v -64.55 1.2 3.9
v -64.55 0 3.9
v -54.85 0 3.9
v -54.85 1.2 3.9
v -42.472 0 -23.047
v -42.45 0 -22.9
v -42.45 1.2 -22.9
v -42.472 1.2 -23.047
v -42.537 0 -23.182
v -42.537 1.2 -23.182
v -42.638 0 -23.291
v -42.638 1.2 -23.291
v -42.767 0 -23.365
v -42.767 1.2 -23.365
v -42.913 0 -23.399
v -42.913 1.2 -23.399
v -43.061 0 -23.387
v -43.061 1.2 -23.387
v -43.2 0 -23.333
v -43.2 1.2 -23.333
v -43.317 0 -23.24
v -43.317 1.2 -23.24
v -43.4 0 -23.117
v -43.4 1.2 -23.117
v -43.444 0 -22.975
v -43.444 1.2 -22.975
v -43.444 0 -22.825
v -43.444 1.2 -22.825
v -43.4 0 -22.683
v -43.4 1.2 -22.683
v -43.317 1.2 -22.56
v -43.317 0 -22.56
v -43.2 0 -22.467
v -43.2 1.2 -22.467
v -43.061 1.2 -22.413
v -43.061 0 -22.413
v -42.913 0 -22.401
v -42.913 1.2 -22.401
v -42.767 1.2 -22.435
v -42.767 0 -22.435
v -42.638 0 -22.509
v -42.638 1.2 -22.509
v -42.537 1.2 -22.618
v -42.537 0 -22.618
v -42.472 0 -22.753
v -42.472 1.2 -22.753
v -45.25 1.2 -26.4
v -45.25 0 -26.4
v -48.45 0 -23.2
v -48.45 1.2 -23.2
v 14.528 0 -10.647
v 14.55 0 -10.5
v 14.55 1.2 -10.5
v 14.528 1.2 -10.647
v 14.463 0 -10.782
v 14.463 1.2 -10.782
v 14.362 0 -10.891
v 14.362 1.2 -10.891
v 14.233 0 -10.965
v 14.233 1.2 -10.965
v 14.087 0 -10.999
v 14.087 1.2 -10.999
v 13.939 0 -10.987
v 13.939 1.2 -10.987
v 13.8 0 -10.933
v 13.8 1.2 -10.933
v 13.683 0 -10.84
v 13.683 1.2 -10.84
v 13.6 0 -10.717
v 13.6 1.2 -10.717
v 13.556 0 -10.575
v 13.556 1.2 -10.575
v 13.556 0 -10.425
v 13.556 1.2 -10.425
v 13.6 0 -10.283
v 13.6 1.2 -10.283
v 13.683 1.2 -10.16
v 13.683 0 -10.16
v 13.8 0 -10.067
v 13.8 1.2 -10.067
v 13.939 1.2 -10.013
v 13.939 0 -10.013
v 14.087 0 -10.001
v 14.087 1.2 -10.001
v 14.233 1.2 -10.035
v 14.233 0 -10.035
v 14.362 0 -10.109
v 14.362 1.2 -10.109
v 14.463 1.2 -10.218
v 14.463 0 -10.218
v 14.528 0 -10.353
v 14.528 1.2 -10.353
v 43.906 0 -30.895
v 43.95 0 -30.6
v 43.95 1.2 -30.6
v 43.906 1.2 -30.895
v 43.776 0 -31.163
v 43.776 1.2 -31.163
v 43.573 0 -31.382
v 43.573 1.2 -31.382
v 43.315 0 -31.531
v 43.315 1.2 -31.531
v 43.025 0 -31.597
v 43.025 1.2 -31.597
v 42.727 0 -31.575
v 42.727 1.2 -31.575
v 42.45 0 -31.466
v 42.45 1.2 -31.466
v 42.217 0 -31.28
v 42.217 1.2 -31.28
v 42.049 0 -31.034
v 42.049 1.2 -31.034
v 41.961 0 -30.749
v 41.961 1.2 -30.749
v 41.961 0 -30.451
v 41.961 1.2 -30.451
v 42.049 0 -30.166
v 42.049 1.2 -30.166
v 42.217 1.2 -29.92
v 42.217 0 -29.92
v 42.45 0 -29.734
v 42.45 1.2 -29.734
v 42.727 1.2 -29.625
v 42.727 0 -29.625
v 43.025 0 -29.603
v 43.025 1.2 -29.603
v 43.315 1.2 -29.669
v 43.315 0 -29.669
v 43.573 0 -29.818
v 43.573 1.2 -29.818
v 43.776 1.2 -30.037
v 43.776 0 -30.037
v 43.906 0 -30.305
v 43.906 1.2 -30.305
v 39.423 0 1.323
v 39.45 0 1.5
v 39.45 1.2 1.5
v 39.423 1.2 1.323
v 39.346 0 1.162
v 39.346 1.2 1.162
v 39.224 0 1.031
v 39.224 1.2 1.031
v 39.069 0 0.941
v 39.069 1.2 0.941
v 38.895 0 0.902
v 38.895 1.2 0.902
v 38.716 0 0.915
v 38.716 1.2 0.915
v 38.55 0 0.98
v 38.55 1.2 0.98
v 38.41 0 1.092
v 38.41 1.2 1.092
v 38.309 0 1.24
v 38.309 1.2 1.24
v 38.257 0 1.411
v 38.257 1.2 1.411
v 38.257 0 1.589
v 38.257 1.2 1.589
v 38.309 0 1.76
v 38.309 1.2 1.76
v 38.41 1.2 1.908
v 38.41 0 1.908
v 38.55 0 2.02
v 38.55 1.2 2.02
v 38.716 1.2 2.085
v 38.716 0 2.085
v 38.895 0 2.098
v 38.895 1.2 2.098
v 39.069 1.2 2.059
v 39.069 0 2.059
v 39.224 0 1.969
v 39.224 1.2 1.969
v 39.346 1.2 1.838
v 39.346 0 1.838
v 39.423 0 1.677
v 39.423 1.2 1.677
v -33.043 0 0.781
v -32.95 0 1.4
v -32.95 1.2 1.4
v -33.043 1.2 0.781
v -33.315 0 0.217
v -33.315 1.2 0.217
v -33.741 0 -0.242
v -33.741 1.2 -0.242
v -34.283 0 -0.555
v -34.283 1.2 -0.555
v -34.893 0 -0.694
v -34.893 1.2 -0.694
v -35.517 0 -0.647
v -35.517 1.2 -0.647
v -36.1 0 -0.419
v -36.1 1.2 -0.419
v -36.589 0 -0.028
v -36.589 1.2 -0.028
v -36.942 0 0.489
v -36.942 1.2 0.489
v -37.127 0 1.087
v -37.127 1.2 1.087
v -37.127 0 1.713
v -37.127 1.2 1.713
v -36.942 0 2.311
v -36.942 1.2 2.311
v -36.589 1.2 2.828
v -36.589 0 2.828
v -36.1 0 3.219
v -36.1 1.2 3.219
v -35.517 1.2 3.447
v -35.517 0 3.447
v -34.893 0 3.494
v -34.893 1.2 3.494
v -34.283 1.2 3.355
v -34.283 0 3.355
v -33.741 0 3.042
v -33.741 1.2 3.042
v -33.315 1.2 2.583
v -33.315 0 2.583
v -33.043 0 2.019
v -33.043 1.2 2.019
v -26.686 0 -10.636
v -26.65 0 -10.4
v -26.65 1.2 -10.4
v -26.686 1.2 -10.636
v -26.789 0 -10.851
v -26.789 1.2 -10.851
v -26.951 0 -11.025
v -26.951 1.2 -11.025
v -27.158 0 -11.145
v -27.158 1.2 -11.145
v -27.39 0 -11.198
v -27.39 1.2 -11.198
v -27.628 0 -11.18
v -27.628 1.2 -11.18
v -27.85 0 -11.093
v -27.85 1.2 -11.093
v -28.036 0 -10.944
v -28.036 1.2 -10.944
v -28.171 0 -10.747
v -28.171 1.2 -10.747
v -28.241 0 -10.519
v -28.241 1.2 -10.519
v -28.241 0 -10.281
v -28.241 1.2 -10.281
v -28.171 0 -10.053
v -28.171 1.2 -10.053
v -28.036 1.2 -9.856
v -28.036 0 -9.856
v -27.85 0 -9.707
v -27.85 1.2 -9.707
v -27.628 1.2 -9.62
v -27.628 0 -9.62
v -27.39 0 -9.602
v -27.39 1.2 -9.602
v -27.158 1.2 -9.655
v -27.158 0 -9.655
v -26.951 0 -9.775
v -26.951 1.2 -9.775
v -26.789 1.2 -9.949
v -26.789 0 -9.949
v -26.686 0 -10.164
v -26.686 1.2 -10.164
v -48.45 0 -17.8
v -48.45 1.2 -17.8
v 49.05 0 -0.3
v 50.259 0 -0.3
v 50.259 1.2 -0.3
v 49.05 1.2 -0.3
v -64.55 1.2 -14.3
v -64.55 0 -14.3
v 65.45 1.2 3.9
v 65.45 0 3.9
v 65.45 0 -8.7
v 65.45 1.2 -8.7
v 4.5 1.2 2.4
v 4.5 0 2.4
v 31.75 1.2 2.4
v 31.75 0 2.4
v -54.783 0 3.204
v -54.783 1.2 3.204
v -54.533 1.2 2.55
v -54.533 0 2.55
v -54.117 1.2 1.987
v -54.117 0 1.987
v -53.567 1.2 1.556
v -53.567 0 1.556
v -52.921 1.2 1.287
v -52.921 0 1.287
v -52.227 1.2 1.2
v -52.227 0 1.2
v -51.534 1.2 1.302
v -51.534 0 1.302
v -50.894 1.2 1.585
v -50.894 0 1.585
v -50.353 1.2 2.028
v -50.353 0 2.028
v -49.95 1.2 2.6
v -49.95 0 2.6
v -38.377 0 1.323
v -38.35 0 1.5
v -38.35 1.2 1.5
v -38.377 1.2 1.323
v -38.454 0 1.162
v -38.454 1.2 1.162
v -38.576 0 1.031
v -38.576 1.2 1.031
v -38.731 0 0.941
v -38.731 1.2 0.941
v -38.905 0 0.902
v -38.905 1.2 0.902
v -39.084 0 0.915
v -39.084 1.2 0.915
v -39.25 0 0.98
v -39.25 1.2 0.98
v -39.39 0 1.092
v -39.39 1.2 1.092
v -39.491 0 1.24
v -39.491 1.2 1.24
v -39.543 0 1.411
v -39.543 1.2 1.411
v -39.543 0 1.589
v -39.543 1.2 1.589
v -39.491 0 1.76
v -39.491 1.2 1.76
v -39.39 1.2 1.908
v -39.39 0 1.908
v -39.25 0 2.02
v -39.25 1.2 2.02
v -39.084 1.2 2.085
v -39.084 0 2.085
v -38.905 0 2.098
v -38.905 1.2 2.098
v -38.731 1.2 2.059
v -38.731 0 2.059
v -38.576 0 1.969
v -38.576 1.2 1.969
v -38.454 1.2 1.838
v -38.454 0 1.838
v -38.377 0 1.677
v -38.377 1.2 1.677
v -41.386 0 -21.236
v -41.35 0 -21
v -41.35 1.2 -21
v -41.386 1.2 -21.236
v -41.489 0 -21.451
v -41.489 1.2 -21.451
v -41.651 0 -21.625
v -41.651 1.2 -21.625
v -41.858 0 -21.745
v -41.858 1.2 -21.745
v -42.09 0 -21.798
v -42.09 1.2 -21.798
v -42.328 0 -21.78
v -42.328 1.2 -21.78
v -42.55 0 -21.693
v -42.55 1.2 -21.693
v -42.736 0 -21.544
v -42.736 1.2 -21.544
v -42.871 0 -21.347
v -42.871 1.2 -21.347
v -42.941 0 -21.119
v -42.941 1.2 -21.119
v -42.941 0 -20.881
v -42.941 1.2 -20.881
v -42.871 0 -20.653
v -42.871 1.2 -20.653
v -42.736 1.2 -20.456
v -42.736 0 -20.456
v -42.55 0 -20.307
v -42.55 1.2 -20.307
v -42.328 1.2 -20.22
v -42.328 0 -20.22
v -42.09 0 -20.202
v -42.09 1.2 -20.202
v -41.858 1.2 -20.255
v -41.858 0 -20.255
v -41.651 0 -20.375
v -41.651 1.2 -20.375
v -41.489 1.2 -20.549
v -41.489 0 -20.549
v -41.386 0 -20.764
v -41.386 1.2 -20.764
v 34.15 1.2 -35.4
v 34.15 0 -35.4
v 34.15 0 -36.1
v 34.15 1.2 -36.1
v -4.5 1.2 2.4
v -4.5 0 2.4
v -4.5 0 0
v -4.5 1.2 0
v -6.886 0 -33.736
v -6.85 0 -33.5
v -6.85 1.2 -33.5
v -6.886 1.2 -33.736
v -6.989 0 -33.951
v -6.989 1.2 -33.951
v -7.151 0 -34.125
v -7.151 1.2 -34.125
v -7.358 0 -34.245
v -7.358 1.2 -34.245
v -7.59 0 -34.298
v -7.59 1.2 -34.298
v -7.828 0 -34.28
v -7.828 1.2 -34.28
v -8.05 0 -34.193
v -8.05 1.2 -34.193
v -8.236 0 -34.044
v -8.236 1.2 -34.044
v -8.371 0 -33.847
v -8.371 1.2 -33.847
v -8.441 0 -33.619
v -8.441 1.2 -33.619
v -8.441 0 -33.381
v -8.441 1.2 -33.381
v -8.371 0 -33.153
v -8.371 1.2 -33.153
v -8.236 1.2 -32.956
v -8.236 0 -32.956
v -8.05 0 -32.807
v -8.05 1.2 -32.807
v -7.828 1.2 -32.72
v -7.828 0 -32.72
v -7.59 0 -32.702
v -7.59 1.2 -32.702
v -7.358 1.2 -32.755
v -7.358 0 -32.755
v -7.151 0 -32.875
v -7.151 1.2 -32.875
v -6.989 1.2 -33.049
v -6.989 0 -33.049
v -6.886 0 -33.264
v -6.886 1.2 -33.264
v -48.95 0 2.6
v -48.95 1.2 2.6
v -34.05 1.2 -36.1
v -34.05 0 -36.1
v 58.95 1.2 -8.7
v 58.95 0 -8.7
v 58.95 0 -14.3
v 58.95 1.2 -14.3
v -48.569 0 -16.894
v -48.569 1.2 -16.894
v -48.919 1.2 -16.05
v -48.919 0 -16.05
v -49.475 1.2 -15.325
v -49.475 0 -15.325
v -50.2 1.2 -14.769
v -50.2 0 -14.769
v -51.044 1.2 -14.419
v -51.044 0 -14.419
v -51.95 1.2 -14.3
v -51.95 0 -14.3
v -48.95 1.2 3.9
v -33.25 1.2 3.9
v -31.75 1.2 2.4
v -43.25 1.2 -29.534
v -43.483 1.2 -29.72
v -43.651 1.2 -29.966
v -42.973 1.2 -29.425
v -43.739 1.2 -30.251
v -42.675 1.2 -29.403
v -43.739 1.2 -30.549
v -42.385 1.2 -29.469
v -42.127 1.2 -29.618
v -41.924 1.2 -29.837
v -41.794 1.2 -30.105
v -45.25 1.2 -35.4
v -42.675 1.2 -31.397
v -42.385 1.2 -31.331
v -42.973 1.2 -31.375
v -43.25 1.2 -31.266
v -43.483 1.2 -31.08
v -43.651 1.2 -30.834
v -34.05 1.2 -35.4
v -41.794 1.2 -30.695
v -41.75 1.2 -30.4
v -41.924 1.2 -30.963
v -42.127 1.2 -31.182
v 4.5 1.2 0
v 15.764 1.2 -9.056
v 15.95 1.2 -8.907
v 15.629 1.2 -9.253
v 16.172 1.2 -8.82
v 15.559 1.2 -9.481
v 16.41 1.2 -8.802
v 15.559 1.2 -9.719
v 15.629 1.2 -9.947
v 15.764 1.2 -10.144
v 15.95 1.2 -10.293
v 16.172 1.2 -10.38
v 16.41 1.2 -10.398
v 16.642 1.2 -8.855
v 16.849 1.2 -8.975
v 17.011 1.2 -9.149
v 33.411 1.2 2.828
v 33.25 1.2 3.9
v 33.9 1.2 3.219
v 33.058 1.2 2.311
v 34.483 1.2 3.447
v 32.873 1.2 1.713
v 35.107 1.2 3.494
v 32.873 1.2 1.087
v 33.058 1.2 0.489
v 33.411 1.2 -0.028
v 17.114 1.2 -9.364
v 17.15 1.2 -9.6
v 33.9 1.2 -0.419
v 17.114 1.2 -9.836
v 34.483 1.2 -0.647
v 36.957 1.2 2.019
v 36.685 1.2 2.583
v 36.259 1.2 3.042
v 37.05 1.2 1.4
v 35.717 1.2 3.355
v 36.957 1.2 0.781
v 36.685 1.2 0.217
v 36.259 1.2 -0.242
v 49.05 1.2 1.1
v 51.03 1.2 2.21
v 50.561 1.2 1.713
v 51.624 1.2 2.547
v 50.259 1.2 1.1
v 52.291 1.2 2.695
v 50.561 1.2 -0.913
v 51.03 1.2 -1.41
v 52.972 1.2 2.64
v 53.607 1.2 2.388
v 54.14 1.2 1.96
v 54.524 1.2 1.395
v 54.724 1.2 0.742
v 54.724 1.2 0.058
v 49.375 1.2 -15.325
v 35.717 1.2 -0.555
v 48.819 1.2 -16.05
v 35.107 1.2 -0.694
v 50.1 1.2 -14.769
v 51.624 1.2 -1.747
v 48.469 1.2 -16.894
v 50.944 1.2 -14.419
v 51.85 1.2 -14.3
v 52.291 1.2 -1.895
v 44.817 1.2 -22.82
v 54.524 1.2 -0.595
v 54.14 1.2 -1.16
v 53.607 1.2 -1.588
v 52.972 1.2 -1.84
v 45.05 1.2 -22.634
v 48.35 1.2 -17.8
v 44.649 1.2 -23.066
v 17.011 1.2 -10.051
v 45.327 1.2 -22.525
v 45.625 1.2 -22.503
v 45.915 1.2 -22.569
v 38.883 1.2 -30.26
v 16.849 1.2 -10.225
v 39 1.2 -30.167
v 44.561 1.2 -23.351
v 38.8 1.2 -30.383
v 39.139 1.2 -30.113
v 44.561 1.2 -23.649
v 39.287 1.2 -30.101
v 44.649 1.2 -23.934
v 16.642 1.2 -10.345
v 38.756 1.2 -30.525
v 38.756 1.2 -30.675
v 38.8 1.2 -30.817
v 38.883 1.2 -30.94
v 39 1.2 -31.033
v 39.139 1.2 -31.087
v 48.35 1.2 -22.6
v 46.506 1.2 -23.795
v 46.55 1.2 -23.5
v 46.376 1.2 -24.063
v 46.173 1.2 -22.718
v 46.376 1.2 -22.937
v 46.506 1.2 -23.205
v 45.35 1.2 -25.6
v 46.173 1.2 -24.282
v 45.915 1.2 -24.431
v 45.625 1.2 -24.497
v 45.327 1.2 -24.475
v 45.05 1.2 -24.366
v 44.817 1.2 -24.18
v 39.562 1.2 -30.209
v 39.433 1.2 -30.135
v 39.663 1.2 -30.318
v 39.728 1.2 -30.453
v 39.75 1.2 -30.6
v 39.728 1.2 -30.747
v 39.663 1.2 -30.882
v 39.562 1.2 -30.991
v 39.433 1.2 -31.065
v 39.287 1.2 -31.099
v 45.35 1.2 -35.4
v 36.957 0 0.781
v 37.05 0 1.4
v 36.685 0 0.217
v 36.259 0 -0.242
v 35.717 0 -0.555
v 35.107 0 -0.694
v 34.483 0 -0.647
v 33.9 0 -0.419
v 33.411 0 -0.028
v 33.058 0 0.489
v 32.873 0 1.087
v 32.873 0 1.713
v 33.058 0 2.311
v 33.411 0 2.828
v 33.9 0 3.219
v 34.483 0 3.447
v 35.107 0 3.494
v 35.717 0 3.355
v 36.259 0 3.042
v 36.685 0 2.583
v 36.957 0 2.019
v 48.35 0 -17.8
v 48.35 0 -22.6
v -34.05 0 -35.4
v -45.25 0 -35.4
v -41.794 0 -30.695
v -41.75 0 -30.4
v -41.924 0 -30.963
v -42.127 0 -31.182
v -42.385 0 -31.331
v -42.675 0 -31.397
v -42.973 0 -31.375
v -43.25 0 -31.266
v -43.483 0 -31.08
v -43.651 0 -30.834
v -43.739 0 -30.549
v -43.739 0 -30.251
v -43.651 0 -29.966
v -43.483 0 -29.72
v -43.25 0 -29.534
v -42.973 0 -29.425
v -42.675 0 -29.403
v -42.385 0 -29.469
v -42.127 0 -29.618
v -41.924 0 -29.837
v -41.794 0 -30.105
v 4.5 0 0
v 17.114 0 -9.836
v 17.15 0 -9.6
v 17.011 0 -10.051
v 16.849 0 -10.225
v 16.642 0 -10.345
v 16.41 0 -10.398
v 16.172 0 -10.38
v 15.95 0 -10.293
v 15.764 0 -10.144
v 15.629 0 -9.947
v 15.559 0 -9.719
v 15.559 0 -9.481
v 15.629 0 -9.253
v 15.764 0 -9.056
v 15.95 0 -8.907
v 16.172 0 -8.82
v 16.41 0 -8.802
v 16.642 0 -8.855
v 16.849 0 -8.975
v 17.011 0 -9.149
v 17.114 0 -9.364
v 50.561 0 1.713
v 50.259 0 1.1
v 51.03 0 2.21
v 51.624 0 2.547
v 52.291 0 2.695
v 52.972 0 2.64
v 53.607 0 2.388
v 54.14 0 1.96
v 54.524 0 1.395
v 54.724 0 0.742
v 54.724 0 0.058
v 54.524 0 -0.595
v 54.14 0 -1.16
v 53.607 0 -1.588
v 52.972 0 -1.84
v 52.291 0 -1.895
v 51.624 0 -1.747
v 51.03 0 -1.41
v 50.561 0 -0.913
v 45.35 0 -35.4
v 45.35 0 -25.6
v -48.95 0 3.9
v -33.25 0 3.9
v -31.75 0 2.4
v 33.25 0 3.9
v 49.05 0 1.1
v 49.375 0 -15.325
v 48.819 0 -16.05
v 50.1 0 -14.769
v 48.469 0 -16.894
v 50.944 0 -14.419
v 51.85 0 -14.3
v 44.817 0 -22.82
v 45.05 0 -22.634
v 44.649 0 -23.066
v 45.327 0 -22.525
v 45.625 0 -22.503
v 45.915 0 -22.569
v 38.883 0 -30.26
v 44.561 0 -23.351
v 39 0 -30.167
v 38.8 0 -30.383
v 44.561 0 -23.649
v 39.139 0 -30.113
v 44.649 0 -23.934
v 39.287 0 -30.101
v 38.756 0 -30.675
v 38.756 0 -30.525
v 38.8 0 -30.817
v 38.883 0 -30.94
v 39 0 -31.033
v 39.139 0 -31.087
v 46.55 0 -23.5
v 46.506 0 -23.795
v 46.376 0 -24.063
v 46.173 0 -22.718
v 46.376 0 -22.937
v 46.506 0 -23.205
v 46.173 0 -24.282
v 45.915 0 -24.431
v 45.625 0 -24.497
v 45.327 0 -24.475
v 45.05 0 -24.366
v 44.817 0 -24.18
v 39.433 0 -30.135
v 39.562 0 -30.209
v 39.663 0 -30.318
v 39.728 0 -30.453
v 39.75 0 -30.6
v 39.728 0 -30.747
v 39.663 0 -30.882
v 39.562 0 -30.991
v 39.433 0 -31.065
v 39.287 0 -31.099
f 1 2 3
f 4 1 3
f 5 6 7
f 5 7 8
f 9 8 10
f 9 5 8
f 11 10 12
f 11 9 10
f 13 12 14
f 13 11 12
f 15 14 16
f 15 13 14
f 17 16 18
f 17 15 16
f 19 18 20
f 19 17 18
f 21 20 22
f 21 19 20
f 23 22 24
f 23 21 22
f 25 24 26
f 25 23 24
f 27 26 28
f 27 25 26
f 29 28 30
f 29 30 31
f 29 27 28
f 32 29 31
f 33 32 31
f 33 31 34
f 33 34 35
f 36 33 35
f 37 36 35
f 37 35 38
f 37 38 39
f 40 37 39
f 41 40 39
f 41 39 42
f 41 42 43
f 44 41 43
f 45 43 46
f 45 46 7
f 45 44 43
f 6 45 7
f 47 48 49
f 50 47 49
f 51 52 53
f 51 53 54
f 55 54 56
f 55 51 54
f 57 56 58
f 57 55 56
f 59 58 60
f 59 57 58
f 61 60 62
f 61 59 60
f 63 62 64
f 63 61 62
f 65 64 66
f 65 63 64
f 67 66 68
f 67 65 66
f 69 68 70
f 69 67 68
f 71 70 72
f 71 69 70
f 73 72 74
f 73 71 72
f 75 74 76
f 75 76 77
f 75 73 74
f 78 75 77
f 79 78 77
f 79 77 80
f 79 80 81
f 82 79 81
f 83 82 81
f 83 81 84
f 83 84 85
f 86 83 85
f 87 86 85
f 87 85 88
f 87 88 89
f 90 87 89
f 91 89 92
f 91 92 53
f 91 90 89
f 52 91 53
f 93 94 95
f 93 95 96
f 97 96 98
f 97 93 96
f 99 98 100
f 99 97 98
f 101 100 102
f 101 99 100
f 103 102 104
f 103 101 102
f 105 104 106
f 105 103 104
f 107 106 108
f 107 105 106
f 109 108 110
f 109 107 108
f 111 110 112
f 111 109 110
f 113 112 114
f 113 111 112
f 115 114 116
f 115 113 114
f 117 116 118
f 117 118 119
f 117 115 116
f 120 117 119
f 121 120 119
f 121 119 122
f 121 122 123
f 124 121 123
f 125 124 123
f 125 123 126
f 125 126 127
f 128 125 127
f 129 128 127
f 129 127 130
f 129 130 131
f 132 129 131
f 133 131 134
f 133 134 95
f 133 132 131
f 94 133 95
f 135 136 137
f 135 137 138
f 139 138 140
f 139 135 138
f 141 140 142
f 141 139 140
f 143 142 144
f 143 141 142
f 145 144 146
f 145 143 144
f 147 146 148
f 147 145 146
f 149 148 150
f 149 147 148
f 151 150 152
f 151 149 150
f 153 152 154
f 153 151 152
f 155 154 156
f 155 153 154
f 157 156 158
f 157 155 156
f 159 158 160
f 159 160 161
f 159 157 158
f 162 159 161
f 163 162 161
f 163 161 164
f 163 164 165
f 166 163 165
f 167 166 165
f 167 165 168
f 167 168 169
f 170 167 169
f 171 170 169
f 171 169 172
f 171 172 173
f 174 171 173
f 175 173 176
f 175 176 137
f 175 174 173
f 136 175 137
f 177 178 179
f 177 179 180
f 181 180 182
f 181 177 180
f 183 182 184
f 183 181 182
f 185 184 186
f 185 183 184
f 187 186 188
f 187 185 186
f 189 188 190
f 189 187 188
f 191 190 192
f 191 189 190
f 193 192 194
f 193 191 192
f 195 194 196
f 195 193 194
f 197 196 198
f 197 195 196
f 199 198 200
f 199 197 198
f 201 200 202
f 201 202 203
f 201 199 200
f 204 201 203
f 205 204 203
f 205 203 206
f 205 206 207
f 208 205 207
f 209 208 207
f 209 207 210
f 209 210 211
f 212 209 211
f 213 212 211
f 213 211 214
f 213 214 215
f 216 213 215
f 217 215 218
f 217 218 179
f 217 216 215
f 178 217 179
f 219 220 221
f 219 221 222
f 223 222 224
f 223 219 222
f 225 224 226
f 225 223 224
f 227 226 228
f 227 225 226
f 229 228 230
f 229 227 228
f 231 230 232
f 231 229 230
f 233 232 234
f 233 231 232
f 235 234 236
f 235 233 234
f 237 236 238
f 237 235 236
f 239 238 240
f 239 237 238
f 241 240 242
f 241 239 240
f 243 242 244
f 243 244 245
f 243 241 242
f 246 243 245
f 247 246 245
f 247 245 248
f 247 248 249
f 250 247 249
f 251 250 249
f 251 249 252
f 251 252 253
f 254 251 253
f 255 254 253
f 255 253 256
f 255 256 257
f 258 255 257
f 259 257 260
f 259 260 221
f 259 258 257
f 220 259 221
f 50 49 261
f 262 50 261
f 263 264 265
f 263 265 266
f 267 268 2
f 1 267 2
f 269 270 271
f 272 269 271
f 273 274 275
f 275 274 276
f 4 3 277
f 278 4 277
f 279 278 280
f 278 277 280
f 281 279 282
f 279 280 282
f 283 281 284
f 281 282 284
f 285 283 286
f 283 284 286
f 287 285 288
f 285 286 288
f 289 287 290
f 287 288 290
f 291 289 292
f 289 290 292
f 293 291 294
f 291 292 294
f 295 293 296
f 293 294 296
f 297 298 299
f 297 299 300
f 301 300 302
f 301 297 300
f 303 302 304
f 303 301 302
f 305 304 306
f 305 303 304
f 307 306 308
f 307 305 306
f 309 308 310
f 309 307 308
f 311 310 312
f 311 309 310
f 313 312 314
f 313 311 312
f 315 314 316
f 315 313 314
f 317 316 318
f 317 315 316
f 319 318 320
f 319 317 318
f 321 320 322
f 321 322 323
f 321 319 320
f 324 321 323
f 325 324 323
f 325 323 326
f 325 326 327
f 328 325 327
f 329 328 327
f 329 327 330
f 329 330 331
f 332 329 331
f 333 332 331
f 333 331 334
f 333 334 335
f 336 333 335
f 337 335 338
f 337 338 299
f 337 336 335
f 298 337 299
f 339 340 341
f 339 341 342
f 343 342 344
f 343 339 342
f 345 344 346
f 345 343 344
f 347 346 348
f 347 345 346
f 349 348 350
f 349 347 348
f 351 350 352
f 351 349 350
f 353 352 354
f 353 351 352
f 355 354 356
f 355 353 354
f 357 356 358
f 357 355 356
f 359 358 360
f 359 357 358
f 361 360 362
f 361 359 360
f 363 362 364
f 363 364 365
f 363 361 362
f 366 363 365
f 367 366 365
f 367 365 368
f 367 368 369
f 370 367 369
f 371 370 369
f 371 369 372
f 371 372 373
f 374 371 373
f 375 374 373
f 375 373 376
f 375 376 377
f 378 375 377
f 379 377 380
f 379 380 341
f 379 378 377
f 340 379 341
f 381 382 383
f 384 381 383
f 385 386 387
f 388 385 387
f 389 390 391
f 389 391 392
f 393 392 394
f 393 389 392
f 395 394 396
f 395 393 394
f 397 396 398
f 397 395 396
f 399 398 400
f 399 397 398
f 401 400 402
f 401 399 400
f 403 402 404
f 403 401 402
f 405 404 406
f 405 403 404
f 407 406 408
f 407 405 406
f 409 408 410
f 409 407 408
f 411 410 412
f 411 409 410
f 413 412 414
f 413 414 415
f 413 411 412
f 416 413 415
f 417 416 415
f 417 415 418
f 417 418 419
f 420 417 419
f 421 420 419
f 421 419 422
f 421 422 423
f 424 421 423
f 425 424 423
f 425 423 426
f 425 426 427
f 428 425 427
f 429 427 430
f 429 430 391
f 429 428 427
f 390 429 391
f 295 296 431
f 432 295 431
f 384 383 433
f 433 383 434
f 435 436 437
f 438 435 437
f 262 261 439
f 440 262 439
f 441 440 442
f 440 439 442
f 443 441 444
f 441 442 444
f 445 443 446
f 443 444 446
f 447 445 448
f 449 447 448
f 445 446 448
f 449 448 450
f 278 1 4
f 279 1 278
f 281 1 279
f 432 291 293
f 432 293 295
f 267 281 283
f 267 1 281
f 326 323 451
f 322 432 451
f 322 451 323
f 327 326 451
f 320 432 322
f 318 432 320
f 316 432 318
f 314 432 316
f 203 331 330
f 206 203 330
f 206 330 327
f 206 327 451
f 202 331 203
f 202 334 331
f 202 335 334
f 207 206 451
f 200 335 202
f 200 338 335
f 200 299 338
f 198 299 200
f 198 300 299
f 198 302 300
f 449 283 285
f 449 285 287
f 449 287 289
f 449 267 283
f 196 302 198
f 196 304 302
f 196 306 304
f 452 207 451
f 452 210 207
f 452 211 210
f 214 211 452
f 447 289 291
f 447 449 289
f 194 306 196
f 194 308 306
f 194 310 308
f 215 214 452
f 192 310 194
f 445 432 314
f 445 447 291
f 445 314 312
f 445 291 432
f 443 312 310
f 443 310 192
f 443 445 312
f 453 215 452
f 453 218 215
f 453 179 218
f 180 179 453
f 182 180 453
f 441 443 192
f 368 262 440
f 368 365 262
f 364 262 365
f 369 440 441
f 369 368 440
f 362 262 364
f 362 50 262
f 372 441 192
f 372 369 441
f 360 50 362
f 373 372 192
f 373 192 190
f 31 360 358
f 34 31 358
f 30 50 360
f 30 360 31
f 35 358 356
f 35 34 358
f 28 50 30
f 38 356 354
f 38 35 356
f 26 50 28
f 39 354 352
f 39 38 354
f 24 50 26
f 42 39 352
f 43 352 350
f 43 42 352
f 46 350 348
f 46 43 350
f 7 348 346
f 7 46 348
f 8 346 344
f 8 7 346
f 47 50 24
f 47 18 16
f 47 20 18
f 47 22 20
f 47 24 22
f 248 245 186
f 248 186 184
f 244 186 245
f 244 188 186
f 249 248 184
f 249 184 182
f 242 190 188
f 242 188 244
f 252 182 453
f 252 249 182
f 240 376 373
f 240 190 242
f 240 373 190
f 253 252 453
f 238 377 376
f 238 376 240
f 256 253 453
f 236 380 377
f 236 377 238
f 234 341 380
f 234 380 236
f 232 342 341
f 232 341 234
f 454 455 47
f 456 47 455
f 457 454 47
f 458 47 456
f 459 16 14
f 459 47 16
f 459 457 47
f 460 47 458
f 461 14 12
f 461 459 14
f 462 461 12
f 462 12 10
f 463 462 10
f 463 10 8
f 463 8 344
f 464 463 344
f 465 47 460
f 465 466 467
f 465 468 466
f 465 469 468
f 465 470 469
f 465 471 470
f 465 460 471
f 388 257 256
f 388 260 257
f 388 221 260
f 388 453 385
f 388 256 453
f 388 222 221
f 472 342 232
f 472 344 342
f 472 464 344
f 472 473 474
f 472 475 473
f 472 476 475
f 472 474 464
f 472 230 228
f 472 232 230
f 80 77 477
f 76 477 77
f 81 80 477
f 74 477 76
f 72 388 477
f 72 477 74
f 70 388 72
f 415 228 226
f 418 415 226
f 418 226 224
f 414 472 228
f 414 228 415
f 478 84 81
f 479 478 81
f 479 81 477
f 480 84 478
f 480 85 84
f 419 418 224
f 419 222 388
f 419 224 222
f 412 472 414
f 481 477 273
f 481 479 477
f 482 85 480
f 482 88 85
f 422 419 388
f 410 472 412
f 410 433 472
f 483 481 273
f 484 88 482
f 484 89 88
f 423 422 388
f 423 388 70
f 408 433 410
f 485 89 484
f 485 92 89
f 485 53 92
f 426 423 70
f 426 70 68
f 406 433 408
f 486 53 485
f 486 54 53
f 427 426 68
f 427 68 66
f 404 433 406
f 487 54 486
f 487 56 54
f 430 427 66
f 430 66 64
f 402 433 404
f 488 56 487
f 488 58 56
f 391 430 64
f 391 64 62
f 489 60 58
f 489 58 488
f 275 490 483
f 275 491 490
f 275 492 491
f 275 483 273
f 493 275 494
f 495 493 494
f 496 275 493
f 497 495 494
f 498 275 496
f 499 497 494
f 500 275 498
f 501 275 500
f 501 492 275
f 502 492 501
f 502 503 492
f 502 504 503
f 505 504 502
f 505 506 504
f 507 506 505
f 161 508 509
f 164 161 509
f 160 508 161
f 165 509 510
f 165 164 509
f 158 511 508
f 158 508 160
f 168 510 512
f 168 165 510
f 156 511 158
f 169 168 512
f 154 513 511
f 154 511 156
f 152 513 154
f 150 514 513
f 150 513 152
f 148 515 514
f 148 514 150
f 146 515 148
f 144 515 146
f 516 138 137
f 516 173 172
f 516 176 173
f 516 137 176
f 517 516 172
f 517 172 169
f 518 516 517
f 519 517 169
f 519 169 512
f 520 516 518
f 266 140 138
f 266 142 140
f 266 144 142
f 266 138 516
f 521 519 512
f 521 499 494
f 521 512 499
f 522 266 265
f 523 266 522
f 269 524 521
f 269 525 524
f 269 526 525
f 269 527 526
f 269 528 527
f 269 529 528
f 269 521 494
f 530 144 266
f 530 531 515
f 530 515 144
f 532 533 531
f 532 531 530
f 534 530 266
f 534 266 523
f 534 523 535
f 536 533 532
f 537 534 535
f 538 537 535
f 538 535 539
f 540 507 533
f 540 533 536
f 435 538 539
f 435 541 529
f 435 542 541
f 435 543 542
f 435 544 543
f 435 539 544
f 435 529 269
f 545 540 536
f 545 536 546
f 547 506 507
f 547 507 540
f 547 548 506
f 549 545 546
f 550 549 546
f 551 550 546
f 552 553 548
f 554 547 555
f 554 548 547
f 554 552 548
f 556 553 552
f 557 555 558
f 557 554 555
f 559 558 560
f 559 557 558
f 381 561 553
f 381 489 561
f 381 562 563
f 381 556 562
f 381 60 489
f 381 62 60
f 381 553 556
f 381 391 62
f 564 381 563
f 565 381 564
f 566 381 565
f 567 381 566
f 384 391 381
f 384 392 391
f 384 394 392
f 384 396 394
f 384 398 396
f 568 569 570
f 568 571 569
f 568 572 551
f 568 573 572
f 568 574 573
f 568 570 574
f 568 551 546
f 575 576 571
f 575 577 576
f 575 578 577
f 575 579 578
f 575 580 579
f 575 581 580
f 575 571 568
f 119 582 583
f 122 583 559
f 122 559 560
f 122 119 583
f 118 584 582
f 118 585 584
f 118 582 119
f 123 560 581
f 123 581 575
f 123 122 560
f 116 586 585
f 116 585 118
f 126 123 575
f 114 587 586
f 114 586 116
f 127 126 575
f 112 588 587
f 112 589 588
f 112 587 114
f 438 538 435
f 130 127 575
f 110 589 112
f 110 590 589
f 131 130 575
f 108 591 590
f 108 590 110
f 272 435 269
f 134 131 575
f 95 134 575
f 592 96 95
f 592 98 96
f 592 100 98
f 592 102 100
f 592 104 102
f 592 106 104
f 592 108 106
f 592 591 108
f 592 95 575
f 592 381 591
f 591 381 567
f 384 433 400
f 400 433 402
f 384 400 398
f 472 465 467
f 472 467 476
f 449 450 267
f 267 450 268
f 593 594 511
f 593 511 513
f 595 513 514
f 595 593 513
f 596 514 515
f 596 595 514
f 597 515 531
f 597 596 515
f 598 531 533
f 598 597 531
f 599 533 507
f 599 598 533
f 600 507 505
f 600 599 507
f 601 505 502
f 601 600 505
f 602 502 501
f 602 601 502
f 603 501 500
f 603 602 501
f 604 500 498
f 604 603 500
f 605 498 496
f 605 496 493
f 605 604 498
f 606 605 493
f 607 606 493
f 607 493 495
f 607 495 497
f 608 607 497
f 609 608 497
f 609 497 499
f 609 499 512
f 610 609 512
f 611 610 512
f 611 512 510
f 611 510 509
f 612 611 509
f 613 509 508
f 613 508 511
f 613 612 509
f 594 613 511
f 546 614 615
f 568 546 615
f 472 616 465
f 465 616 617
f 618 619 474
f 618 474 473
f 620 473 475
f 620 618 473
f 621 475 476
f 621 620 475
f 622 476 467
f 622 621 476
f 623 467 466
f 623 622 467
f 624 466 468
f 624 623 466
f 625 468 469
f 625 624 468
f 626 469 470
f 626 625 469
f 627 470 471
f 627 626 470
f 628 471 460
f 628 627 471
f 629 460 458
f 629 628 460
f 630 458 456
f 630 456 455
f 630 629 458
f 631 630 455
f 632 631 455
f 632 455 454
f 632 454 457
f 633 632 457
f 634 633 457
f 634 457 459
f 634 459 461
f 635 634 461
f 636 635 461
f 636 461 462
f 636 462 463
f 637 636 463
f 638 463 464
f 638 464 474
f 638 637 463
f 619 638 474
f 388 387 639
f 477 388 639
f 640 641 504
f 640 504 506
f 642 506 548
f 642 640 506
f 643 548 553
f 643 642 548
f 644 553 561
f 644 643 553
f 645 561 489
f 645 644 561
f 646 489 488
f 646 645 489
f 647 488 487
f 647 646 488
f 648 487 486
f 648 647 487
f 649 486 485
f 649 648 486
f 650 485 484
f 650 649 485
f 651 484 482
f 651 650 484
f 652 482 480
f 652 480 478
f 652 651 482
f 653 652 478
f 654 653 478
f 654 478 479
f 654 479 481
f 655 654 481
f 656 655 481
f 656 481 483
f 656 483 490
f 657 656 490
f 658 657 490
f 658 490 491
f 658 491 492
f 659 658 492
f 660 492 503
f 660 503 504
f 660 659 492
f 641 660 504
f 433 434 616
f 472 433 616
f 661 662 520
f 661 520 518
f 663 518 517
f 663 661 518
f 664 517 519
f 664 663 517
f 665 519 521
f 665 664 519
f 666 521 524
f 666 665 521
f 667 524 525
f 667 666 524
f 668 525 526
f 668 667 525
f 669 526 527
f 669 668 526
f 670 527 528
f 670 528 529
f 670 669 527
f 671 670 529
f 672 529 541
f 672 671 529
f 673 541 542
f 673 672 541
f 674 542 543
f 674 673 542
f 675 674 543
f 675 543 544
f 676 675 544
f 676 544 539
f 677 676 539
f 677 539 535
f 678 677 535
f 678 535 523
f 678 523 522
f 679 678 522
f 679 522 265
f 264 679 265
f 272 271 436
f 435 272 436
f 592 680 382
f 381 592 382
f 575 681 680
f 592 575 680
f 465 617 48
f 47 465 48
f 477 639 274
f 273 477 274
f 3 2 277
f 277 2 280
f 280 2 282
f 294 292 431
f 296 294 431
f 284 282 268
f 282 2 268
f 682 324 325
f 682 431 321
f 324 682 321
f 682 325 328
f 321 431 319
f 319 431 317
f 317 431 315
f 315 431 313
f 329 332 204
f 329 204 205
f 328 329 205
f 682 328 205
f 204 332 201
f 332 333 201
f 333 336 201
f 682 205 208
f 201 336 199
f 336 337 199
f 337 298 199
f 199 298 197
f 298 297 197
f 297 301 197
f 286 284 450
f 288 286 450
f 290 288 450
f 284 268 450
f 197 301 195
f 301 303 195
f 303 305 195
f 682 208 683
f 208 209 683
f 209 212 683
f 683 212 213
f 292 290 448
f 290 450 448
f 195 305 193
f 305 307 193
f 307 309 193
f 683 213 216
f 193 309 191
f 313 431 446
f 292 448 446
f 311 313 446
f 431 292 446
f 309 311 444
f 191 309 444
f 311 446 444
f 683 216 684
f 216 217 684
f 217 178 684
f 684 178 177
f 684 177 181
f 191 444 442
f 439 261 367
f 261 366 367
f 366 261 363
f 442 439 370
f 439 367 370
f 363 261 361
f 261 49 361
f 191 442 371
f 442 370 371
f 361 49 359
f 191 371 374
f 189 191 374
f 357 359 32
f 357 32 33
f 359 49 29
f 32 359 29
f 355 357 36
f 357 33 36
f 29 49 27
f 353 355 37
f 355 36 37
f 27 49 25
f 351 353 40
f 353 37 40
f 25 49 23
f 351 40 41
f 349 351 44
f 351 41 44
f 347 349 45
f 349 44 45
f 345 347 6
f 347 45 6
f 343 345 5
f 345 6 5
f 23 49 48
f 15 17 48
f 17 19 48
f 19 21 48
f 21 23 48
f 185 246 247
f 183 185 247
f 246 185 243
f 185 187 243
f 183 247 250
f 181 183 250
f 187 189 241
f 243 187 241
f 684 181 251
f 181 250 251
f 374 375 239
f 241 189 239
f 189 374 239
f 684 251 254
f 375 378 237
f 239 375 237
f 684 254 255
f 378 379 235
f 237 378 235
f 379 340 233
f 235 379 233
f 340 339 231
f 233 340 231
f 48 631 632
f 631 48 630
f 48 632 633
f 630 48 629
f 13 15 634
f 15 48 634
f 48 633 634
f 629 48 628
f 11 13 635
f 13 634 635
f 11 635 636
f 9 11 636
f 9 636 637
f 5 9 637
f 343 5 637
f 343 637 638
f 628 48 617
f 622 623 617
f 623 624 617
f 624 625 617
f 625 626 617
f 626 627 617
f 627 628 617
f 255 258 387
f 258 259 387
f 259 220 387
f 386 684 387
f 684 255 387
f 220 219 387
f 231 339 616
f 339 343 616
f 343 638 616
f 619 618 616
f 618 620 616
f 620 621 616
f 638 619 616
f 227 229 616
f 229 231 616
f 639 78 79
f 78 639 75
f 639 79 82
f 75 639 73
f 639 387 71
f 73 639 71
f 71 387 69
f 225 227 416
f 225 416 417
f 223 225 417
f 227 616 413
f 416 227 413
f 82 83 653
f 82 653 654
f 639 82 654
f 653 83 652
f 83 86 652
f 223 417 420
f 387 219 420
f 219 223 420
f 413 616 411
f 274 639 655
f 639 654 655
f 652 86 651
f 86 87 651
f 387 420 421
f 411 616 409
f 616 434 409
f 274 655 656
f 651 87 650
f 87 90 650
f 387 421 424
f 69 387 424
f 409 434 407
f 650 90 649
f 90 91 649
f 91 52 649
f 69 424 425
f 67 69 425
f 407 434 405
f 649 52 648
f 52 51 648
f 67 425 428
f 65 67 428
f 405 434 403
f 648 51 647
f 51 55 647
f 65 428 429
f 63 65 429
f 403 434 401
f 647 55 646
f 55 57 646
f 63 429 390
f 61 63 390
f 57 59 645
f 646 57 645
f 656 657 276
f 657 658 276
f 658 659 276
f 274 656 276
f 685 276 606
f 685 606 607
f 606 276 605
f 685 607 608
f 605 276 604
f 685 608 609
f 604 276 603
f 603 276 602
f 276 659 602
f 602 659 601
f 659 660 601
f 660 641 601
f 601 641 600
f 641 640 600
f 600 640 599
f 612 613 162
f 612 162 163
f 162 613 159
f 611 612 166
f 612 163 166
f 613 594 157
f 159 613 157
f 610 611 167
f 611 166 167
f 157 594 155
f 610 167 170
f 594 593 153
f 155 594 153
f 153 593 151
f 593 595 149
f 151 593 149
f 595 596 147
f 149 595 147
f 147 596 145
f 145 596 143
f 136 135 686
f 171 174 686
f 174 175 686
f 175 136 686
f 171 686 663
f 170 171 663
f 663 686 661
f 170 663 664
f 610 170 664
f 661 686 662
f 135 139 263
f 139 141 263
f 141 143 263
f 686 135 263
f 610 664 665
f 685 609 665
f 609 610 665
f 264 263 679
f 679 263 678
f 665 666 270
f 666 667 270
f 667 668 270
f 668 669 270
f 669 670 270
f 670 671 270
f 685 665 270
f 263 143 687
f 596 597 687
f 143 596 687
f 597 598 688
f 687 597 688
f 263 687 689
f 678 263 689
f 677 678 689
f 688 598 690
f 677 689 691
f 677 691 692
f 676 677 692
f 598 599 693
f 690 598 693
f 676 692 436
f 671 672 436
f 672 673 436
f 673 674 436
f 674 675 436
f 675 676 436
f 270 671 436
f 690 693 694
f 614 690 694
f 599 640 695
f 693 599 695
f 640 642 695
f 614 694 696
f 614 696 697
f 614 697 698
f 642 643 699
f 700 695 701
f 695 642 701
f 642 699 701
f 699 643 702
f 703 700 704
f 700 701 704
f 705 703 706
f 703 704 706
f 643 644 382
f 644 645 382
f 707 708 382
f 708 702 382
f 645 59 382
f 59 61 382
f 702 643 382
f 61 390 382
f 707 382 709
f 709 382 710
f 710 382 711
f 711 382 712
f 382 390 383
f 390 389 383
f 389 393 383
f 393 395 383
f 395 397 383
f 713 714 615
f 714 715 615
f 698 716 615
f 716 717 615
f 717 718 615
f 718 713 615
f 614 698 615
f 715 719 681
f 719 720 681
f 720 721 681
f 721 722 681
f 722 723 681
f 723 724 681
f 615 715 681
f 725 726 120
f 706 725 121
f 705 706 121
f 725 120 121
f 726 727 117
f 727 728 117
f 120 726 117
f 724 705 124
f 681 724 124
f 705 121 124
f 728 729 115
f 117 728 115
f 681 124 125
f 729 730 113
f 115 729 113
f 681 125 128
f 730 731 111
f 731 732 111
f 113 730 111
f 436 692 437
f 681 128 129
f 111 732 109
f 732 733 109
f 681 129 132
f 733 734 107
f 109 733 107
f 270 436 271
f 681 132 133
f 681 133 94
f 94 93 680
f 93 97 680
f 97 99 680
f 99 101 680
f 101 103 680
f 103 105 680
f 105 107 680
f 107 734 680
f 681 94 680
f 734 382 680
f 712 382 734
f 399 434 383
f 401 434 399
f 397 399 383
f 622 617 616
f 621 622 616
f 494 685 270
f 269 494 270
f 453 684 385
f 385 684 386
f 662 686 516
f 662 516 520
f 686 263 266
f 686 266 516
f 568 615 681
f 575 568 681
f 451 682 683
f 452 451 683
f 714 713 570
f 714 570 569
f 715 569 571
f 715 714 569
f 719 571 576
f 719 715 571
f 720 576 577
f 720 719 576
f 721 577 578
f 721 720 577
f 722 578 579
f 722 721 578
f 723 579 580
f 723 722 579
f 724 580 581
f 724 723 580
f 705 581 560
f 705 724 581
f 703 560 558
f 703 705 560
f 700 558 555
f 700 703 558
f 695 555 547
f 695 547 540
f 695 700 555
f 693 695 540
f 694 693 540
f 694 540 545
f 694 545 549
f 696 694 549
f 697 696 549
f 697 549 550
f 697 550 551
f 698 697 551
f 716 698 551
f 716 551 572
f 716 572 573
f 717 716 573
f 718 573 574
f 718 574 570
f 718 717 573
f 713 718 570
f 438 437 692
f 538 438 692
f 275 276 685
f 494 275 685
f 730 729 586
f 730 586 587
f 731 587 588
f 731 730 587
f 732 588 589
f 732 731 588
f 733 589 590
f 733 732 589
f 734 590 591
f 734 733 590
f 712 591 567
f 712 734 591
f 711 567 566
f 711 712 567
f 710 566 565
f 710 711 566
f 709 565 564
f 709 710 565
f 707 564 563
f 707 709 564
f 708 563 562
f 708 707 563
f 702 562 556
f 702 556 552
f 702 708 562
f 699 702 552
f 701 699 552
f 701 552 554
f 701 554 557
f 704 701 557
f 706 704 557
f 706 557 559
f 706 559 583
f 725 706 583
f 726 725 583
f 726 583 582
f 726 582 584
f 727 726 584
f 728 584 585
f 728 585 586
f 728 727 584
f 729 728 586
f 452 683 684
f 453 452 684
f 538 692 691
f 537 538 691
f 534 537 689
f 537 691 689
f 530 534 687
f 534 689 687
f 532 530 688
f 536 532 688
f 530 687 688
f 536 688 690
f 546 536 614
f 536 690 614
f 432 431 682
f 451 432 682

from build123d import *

# Parameters (mm, degrees)
BOSS_EXTRU_1_DEPTH      = 1.2
ESQUISSE1_4_R           = 2.1
ESQUISSE1_4_R_2         = 0.8
ESQUISSE1_4_R_3         = 1
ESQUISSE1_4_R_4         = 0.5
ESQUISSE1_4_R_5         = 0.6
ENL_V_MAT_EXTRU_1_DEPTH = 1.2


with BuildPart() as part:
    # Esquisse1 → Boss.-Extru.1 (new body)
    with BuildSketch(Plane(origin=(0, 0, 0), x_dir=(1, 0, 0), z_dir=(0, 1, 0))):
        with BuildLine():
            Line((-64.55, 14.3), (-64.55, -3.9))
            Line((-64.55, -3.9), (-54.85, -3.9))
            ThreePointArc((-54.85, -3.9), (-52.920836567, -1.286846787), (-49.95, -2.6))
            Line((-49.95, -2.6), (-48.95, -2.6))
            Line((-48.95, -2.6), (-48.95, -3.9))
            Line((-48.95, -3.9), (-33.25, -3.9))
            Line((-33.25, -3.9), (-31.75, -2.4))
            Line((-31.75, -2.4), (-4.5, -2.4))
            Line((-4.5, -2.4), (-4.5, 0))
            Line((-4.5, 0), (4.5, 0))
            Line((4.5, 0), (4.5, -2.4))
            Line((4.5, -2.4), (31.75, -2.4))
            Line((31.75, -2.4), (33.25, -3.9))
            Line((33.25, -3.9), (65.45, -3.9))
            Line((65.45, -3.9), (65.45, 8.7))
            Line((65.45, 8.7), (58.95, 8.7))
            Line((58.95, 8.7), (58.95, 14.3))
            Line((58.95, 14.3), (51.85, 14.3))
            ThreePointArc((51.85, 14.3), (49.375126266, 15.325126266), (48.35, 17.8))
            Line((48.35, 17.8), (48.35, 22.6))
            Line((48.35, 22.6), (45.35, 25.6))
            Line((45.35, 25.6), (45.35, 35.4))
            Line((45.35, 35.4), (34.15, 35.4))
            Line((34.15, 35.4), (34.15, 36.1))
            Line((34.15, 36.1), (-34.05, 36.1))
            Line((-34.05, 36.1), (-34.05, 35.4))
            Line((-34.05, 35.4), (-45.25, 35.4))
            Line((-45.25, 35.4), (-45.25, 26.4))
            Line((-45.25, 26.4), (-48.45, 23.2))
            Line((-48.45, 23.2), (-48.45, 17.8))
            ThreePointArc((-48.45, 17.8), (-49.475126266, 15.325126266), (-51.95, 14.3))
            Line((-51.95, 14.3), (-64.55, 14.3))
        make_face()
    extrude(amount=BOSS_EXTRU_1_DEPTH)

    # Esquisse1_4 → Enl_v. mat.-Extru.1 (cut)
    with BuildSketch(Plane(origin=(0, 0, 0), x_dir=(1, 0, 0), z_dir=(0, 1, 0))):
        with BuildLine():
            Line((49.05, -1.1), (50.25910977, -1.1))
            ThreePointArc((50.25910977, -1.1), (54.75, -0.4), (50.25910977, 0.3))
            Line((50.25910977, 0.3), (49.05, 0.3))
            Line((49.05, 0.3), (49.05, -1.1))
        make_face()
        with Locations((34.95, -1.4)):
            Circle(ESQUISSE1_4_R)
        with Locations((-35.05, -1.4)):
            Circle(ESQUISSE1_4_R)
        with Locations((-7.65, 33.5)):
            Circle(ESQUISSE1_4_R_2)
        with Locations((42.95, 30.6)):
            Circle(ESQUISSE1_4_R_3)
        with Locations((-27.45, 10.4)):
            Circle(ESQUISSE1_4_R_2)
        with Locations((16.35, 9.6)):
            Circle(ESQUISSE1_4_R_2)
        with Locations((-42.95, 22.9)):
            Circle(ESQUISSE1_4_R_4)
        with Locations((-42.75, 30.4)):
            Circle(ESQUISSE1_4_R_3)
        with Locations((45.55, 23.5)):
            Circle(ESQUISSE1_4_R_3)
        with Locations((14.05, 10.5)):
            Circle(ESQUISSE1_4_R_4)
        with Locations((-42.15, 21)):
            Circle(ESQUISSE1_4_R_2)
        with Locations((-38.95, -1.5)):
            Circle(ESQUISSE1_4_R_5)
        with Locations((39.25, 30.6)):
            Circle(ESQUISSE1_4_R_4)
        with Locations((38.85, -1.5)):
            Circle(ESQUISSE1_4_R_5)
    extrude(amount=ENL_V_MAT_EXTRU_1_DEPTH, mode=Mode.SUBTRACT)


solid = part.part
